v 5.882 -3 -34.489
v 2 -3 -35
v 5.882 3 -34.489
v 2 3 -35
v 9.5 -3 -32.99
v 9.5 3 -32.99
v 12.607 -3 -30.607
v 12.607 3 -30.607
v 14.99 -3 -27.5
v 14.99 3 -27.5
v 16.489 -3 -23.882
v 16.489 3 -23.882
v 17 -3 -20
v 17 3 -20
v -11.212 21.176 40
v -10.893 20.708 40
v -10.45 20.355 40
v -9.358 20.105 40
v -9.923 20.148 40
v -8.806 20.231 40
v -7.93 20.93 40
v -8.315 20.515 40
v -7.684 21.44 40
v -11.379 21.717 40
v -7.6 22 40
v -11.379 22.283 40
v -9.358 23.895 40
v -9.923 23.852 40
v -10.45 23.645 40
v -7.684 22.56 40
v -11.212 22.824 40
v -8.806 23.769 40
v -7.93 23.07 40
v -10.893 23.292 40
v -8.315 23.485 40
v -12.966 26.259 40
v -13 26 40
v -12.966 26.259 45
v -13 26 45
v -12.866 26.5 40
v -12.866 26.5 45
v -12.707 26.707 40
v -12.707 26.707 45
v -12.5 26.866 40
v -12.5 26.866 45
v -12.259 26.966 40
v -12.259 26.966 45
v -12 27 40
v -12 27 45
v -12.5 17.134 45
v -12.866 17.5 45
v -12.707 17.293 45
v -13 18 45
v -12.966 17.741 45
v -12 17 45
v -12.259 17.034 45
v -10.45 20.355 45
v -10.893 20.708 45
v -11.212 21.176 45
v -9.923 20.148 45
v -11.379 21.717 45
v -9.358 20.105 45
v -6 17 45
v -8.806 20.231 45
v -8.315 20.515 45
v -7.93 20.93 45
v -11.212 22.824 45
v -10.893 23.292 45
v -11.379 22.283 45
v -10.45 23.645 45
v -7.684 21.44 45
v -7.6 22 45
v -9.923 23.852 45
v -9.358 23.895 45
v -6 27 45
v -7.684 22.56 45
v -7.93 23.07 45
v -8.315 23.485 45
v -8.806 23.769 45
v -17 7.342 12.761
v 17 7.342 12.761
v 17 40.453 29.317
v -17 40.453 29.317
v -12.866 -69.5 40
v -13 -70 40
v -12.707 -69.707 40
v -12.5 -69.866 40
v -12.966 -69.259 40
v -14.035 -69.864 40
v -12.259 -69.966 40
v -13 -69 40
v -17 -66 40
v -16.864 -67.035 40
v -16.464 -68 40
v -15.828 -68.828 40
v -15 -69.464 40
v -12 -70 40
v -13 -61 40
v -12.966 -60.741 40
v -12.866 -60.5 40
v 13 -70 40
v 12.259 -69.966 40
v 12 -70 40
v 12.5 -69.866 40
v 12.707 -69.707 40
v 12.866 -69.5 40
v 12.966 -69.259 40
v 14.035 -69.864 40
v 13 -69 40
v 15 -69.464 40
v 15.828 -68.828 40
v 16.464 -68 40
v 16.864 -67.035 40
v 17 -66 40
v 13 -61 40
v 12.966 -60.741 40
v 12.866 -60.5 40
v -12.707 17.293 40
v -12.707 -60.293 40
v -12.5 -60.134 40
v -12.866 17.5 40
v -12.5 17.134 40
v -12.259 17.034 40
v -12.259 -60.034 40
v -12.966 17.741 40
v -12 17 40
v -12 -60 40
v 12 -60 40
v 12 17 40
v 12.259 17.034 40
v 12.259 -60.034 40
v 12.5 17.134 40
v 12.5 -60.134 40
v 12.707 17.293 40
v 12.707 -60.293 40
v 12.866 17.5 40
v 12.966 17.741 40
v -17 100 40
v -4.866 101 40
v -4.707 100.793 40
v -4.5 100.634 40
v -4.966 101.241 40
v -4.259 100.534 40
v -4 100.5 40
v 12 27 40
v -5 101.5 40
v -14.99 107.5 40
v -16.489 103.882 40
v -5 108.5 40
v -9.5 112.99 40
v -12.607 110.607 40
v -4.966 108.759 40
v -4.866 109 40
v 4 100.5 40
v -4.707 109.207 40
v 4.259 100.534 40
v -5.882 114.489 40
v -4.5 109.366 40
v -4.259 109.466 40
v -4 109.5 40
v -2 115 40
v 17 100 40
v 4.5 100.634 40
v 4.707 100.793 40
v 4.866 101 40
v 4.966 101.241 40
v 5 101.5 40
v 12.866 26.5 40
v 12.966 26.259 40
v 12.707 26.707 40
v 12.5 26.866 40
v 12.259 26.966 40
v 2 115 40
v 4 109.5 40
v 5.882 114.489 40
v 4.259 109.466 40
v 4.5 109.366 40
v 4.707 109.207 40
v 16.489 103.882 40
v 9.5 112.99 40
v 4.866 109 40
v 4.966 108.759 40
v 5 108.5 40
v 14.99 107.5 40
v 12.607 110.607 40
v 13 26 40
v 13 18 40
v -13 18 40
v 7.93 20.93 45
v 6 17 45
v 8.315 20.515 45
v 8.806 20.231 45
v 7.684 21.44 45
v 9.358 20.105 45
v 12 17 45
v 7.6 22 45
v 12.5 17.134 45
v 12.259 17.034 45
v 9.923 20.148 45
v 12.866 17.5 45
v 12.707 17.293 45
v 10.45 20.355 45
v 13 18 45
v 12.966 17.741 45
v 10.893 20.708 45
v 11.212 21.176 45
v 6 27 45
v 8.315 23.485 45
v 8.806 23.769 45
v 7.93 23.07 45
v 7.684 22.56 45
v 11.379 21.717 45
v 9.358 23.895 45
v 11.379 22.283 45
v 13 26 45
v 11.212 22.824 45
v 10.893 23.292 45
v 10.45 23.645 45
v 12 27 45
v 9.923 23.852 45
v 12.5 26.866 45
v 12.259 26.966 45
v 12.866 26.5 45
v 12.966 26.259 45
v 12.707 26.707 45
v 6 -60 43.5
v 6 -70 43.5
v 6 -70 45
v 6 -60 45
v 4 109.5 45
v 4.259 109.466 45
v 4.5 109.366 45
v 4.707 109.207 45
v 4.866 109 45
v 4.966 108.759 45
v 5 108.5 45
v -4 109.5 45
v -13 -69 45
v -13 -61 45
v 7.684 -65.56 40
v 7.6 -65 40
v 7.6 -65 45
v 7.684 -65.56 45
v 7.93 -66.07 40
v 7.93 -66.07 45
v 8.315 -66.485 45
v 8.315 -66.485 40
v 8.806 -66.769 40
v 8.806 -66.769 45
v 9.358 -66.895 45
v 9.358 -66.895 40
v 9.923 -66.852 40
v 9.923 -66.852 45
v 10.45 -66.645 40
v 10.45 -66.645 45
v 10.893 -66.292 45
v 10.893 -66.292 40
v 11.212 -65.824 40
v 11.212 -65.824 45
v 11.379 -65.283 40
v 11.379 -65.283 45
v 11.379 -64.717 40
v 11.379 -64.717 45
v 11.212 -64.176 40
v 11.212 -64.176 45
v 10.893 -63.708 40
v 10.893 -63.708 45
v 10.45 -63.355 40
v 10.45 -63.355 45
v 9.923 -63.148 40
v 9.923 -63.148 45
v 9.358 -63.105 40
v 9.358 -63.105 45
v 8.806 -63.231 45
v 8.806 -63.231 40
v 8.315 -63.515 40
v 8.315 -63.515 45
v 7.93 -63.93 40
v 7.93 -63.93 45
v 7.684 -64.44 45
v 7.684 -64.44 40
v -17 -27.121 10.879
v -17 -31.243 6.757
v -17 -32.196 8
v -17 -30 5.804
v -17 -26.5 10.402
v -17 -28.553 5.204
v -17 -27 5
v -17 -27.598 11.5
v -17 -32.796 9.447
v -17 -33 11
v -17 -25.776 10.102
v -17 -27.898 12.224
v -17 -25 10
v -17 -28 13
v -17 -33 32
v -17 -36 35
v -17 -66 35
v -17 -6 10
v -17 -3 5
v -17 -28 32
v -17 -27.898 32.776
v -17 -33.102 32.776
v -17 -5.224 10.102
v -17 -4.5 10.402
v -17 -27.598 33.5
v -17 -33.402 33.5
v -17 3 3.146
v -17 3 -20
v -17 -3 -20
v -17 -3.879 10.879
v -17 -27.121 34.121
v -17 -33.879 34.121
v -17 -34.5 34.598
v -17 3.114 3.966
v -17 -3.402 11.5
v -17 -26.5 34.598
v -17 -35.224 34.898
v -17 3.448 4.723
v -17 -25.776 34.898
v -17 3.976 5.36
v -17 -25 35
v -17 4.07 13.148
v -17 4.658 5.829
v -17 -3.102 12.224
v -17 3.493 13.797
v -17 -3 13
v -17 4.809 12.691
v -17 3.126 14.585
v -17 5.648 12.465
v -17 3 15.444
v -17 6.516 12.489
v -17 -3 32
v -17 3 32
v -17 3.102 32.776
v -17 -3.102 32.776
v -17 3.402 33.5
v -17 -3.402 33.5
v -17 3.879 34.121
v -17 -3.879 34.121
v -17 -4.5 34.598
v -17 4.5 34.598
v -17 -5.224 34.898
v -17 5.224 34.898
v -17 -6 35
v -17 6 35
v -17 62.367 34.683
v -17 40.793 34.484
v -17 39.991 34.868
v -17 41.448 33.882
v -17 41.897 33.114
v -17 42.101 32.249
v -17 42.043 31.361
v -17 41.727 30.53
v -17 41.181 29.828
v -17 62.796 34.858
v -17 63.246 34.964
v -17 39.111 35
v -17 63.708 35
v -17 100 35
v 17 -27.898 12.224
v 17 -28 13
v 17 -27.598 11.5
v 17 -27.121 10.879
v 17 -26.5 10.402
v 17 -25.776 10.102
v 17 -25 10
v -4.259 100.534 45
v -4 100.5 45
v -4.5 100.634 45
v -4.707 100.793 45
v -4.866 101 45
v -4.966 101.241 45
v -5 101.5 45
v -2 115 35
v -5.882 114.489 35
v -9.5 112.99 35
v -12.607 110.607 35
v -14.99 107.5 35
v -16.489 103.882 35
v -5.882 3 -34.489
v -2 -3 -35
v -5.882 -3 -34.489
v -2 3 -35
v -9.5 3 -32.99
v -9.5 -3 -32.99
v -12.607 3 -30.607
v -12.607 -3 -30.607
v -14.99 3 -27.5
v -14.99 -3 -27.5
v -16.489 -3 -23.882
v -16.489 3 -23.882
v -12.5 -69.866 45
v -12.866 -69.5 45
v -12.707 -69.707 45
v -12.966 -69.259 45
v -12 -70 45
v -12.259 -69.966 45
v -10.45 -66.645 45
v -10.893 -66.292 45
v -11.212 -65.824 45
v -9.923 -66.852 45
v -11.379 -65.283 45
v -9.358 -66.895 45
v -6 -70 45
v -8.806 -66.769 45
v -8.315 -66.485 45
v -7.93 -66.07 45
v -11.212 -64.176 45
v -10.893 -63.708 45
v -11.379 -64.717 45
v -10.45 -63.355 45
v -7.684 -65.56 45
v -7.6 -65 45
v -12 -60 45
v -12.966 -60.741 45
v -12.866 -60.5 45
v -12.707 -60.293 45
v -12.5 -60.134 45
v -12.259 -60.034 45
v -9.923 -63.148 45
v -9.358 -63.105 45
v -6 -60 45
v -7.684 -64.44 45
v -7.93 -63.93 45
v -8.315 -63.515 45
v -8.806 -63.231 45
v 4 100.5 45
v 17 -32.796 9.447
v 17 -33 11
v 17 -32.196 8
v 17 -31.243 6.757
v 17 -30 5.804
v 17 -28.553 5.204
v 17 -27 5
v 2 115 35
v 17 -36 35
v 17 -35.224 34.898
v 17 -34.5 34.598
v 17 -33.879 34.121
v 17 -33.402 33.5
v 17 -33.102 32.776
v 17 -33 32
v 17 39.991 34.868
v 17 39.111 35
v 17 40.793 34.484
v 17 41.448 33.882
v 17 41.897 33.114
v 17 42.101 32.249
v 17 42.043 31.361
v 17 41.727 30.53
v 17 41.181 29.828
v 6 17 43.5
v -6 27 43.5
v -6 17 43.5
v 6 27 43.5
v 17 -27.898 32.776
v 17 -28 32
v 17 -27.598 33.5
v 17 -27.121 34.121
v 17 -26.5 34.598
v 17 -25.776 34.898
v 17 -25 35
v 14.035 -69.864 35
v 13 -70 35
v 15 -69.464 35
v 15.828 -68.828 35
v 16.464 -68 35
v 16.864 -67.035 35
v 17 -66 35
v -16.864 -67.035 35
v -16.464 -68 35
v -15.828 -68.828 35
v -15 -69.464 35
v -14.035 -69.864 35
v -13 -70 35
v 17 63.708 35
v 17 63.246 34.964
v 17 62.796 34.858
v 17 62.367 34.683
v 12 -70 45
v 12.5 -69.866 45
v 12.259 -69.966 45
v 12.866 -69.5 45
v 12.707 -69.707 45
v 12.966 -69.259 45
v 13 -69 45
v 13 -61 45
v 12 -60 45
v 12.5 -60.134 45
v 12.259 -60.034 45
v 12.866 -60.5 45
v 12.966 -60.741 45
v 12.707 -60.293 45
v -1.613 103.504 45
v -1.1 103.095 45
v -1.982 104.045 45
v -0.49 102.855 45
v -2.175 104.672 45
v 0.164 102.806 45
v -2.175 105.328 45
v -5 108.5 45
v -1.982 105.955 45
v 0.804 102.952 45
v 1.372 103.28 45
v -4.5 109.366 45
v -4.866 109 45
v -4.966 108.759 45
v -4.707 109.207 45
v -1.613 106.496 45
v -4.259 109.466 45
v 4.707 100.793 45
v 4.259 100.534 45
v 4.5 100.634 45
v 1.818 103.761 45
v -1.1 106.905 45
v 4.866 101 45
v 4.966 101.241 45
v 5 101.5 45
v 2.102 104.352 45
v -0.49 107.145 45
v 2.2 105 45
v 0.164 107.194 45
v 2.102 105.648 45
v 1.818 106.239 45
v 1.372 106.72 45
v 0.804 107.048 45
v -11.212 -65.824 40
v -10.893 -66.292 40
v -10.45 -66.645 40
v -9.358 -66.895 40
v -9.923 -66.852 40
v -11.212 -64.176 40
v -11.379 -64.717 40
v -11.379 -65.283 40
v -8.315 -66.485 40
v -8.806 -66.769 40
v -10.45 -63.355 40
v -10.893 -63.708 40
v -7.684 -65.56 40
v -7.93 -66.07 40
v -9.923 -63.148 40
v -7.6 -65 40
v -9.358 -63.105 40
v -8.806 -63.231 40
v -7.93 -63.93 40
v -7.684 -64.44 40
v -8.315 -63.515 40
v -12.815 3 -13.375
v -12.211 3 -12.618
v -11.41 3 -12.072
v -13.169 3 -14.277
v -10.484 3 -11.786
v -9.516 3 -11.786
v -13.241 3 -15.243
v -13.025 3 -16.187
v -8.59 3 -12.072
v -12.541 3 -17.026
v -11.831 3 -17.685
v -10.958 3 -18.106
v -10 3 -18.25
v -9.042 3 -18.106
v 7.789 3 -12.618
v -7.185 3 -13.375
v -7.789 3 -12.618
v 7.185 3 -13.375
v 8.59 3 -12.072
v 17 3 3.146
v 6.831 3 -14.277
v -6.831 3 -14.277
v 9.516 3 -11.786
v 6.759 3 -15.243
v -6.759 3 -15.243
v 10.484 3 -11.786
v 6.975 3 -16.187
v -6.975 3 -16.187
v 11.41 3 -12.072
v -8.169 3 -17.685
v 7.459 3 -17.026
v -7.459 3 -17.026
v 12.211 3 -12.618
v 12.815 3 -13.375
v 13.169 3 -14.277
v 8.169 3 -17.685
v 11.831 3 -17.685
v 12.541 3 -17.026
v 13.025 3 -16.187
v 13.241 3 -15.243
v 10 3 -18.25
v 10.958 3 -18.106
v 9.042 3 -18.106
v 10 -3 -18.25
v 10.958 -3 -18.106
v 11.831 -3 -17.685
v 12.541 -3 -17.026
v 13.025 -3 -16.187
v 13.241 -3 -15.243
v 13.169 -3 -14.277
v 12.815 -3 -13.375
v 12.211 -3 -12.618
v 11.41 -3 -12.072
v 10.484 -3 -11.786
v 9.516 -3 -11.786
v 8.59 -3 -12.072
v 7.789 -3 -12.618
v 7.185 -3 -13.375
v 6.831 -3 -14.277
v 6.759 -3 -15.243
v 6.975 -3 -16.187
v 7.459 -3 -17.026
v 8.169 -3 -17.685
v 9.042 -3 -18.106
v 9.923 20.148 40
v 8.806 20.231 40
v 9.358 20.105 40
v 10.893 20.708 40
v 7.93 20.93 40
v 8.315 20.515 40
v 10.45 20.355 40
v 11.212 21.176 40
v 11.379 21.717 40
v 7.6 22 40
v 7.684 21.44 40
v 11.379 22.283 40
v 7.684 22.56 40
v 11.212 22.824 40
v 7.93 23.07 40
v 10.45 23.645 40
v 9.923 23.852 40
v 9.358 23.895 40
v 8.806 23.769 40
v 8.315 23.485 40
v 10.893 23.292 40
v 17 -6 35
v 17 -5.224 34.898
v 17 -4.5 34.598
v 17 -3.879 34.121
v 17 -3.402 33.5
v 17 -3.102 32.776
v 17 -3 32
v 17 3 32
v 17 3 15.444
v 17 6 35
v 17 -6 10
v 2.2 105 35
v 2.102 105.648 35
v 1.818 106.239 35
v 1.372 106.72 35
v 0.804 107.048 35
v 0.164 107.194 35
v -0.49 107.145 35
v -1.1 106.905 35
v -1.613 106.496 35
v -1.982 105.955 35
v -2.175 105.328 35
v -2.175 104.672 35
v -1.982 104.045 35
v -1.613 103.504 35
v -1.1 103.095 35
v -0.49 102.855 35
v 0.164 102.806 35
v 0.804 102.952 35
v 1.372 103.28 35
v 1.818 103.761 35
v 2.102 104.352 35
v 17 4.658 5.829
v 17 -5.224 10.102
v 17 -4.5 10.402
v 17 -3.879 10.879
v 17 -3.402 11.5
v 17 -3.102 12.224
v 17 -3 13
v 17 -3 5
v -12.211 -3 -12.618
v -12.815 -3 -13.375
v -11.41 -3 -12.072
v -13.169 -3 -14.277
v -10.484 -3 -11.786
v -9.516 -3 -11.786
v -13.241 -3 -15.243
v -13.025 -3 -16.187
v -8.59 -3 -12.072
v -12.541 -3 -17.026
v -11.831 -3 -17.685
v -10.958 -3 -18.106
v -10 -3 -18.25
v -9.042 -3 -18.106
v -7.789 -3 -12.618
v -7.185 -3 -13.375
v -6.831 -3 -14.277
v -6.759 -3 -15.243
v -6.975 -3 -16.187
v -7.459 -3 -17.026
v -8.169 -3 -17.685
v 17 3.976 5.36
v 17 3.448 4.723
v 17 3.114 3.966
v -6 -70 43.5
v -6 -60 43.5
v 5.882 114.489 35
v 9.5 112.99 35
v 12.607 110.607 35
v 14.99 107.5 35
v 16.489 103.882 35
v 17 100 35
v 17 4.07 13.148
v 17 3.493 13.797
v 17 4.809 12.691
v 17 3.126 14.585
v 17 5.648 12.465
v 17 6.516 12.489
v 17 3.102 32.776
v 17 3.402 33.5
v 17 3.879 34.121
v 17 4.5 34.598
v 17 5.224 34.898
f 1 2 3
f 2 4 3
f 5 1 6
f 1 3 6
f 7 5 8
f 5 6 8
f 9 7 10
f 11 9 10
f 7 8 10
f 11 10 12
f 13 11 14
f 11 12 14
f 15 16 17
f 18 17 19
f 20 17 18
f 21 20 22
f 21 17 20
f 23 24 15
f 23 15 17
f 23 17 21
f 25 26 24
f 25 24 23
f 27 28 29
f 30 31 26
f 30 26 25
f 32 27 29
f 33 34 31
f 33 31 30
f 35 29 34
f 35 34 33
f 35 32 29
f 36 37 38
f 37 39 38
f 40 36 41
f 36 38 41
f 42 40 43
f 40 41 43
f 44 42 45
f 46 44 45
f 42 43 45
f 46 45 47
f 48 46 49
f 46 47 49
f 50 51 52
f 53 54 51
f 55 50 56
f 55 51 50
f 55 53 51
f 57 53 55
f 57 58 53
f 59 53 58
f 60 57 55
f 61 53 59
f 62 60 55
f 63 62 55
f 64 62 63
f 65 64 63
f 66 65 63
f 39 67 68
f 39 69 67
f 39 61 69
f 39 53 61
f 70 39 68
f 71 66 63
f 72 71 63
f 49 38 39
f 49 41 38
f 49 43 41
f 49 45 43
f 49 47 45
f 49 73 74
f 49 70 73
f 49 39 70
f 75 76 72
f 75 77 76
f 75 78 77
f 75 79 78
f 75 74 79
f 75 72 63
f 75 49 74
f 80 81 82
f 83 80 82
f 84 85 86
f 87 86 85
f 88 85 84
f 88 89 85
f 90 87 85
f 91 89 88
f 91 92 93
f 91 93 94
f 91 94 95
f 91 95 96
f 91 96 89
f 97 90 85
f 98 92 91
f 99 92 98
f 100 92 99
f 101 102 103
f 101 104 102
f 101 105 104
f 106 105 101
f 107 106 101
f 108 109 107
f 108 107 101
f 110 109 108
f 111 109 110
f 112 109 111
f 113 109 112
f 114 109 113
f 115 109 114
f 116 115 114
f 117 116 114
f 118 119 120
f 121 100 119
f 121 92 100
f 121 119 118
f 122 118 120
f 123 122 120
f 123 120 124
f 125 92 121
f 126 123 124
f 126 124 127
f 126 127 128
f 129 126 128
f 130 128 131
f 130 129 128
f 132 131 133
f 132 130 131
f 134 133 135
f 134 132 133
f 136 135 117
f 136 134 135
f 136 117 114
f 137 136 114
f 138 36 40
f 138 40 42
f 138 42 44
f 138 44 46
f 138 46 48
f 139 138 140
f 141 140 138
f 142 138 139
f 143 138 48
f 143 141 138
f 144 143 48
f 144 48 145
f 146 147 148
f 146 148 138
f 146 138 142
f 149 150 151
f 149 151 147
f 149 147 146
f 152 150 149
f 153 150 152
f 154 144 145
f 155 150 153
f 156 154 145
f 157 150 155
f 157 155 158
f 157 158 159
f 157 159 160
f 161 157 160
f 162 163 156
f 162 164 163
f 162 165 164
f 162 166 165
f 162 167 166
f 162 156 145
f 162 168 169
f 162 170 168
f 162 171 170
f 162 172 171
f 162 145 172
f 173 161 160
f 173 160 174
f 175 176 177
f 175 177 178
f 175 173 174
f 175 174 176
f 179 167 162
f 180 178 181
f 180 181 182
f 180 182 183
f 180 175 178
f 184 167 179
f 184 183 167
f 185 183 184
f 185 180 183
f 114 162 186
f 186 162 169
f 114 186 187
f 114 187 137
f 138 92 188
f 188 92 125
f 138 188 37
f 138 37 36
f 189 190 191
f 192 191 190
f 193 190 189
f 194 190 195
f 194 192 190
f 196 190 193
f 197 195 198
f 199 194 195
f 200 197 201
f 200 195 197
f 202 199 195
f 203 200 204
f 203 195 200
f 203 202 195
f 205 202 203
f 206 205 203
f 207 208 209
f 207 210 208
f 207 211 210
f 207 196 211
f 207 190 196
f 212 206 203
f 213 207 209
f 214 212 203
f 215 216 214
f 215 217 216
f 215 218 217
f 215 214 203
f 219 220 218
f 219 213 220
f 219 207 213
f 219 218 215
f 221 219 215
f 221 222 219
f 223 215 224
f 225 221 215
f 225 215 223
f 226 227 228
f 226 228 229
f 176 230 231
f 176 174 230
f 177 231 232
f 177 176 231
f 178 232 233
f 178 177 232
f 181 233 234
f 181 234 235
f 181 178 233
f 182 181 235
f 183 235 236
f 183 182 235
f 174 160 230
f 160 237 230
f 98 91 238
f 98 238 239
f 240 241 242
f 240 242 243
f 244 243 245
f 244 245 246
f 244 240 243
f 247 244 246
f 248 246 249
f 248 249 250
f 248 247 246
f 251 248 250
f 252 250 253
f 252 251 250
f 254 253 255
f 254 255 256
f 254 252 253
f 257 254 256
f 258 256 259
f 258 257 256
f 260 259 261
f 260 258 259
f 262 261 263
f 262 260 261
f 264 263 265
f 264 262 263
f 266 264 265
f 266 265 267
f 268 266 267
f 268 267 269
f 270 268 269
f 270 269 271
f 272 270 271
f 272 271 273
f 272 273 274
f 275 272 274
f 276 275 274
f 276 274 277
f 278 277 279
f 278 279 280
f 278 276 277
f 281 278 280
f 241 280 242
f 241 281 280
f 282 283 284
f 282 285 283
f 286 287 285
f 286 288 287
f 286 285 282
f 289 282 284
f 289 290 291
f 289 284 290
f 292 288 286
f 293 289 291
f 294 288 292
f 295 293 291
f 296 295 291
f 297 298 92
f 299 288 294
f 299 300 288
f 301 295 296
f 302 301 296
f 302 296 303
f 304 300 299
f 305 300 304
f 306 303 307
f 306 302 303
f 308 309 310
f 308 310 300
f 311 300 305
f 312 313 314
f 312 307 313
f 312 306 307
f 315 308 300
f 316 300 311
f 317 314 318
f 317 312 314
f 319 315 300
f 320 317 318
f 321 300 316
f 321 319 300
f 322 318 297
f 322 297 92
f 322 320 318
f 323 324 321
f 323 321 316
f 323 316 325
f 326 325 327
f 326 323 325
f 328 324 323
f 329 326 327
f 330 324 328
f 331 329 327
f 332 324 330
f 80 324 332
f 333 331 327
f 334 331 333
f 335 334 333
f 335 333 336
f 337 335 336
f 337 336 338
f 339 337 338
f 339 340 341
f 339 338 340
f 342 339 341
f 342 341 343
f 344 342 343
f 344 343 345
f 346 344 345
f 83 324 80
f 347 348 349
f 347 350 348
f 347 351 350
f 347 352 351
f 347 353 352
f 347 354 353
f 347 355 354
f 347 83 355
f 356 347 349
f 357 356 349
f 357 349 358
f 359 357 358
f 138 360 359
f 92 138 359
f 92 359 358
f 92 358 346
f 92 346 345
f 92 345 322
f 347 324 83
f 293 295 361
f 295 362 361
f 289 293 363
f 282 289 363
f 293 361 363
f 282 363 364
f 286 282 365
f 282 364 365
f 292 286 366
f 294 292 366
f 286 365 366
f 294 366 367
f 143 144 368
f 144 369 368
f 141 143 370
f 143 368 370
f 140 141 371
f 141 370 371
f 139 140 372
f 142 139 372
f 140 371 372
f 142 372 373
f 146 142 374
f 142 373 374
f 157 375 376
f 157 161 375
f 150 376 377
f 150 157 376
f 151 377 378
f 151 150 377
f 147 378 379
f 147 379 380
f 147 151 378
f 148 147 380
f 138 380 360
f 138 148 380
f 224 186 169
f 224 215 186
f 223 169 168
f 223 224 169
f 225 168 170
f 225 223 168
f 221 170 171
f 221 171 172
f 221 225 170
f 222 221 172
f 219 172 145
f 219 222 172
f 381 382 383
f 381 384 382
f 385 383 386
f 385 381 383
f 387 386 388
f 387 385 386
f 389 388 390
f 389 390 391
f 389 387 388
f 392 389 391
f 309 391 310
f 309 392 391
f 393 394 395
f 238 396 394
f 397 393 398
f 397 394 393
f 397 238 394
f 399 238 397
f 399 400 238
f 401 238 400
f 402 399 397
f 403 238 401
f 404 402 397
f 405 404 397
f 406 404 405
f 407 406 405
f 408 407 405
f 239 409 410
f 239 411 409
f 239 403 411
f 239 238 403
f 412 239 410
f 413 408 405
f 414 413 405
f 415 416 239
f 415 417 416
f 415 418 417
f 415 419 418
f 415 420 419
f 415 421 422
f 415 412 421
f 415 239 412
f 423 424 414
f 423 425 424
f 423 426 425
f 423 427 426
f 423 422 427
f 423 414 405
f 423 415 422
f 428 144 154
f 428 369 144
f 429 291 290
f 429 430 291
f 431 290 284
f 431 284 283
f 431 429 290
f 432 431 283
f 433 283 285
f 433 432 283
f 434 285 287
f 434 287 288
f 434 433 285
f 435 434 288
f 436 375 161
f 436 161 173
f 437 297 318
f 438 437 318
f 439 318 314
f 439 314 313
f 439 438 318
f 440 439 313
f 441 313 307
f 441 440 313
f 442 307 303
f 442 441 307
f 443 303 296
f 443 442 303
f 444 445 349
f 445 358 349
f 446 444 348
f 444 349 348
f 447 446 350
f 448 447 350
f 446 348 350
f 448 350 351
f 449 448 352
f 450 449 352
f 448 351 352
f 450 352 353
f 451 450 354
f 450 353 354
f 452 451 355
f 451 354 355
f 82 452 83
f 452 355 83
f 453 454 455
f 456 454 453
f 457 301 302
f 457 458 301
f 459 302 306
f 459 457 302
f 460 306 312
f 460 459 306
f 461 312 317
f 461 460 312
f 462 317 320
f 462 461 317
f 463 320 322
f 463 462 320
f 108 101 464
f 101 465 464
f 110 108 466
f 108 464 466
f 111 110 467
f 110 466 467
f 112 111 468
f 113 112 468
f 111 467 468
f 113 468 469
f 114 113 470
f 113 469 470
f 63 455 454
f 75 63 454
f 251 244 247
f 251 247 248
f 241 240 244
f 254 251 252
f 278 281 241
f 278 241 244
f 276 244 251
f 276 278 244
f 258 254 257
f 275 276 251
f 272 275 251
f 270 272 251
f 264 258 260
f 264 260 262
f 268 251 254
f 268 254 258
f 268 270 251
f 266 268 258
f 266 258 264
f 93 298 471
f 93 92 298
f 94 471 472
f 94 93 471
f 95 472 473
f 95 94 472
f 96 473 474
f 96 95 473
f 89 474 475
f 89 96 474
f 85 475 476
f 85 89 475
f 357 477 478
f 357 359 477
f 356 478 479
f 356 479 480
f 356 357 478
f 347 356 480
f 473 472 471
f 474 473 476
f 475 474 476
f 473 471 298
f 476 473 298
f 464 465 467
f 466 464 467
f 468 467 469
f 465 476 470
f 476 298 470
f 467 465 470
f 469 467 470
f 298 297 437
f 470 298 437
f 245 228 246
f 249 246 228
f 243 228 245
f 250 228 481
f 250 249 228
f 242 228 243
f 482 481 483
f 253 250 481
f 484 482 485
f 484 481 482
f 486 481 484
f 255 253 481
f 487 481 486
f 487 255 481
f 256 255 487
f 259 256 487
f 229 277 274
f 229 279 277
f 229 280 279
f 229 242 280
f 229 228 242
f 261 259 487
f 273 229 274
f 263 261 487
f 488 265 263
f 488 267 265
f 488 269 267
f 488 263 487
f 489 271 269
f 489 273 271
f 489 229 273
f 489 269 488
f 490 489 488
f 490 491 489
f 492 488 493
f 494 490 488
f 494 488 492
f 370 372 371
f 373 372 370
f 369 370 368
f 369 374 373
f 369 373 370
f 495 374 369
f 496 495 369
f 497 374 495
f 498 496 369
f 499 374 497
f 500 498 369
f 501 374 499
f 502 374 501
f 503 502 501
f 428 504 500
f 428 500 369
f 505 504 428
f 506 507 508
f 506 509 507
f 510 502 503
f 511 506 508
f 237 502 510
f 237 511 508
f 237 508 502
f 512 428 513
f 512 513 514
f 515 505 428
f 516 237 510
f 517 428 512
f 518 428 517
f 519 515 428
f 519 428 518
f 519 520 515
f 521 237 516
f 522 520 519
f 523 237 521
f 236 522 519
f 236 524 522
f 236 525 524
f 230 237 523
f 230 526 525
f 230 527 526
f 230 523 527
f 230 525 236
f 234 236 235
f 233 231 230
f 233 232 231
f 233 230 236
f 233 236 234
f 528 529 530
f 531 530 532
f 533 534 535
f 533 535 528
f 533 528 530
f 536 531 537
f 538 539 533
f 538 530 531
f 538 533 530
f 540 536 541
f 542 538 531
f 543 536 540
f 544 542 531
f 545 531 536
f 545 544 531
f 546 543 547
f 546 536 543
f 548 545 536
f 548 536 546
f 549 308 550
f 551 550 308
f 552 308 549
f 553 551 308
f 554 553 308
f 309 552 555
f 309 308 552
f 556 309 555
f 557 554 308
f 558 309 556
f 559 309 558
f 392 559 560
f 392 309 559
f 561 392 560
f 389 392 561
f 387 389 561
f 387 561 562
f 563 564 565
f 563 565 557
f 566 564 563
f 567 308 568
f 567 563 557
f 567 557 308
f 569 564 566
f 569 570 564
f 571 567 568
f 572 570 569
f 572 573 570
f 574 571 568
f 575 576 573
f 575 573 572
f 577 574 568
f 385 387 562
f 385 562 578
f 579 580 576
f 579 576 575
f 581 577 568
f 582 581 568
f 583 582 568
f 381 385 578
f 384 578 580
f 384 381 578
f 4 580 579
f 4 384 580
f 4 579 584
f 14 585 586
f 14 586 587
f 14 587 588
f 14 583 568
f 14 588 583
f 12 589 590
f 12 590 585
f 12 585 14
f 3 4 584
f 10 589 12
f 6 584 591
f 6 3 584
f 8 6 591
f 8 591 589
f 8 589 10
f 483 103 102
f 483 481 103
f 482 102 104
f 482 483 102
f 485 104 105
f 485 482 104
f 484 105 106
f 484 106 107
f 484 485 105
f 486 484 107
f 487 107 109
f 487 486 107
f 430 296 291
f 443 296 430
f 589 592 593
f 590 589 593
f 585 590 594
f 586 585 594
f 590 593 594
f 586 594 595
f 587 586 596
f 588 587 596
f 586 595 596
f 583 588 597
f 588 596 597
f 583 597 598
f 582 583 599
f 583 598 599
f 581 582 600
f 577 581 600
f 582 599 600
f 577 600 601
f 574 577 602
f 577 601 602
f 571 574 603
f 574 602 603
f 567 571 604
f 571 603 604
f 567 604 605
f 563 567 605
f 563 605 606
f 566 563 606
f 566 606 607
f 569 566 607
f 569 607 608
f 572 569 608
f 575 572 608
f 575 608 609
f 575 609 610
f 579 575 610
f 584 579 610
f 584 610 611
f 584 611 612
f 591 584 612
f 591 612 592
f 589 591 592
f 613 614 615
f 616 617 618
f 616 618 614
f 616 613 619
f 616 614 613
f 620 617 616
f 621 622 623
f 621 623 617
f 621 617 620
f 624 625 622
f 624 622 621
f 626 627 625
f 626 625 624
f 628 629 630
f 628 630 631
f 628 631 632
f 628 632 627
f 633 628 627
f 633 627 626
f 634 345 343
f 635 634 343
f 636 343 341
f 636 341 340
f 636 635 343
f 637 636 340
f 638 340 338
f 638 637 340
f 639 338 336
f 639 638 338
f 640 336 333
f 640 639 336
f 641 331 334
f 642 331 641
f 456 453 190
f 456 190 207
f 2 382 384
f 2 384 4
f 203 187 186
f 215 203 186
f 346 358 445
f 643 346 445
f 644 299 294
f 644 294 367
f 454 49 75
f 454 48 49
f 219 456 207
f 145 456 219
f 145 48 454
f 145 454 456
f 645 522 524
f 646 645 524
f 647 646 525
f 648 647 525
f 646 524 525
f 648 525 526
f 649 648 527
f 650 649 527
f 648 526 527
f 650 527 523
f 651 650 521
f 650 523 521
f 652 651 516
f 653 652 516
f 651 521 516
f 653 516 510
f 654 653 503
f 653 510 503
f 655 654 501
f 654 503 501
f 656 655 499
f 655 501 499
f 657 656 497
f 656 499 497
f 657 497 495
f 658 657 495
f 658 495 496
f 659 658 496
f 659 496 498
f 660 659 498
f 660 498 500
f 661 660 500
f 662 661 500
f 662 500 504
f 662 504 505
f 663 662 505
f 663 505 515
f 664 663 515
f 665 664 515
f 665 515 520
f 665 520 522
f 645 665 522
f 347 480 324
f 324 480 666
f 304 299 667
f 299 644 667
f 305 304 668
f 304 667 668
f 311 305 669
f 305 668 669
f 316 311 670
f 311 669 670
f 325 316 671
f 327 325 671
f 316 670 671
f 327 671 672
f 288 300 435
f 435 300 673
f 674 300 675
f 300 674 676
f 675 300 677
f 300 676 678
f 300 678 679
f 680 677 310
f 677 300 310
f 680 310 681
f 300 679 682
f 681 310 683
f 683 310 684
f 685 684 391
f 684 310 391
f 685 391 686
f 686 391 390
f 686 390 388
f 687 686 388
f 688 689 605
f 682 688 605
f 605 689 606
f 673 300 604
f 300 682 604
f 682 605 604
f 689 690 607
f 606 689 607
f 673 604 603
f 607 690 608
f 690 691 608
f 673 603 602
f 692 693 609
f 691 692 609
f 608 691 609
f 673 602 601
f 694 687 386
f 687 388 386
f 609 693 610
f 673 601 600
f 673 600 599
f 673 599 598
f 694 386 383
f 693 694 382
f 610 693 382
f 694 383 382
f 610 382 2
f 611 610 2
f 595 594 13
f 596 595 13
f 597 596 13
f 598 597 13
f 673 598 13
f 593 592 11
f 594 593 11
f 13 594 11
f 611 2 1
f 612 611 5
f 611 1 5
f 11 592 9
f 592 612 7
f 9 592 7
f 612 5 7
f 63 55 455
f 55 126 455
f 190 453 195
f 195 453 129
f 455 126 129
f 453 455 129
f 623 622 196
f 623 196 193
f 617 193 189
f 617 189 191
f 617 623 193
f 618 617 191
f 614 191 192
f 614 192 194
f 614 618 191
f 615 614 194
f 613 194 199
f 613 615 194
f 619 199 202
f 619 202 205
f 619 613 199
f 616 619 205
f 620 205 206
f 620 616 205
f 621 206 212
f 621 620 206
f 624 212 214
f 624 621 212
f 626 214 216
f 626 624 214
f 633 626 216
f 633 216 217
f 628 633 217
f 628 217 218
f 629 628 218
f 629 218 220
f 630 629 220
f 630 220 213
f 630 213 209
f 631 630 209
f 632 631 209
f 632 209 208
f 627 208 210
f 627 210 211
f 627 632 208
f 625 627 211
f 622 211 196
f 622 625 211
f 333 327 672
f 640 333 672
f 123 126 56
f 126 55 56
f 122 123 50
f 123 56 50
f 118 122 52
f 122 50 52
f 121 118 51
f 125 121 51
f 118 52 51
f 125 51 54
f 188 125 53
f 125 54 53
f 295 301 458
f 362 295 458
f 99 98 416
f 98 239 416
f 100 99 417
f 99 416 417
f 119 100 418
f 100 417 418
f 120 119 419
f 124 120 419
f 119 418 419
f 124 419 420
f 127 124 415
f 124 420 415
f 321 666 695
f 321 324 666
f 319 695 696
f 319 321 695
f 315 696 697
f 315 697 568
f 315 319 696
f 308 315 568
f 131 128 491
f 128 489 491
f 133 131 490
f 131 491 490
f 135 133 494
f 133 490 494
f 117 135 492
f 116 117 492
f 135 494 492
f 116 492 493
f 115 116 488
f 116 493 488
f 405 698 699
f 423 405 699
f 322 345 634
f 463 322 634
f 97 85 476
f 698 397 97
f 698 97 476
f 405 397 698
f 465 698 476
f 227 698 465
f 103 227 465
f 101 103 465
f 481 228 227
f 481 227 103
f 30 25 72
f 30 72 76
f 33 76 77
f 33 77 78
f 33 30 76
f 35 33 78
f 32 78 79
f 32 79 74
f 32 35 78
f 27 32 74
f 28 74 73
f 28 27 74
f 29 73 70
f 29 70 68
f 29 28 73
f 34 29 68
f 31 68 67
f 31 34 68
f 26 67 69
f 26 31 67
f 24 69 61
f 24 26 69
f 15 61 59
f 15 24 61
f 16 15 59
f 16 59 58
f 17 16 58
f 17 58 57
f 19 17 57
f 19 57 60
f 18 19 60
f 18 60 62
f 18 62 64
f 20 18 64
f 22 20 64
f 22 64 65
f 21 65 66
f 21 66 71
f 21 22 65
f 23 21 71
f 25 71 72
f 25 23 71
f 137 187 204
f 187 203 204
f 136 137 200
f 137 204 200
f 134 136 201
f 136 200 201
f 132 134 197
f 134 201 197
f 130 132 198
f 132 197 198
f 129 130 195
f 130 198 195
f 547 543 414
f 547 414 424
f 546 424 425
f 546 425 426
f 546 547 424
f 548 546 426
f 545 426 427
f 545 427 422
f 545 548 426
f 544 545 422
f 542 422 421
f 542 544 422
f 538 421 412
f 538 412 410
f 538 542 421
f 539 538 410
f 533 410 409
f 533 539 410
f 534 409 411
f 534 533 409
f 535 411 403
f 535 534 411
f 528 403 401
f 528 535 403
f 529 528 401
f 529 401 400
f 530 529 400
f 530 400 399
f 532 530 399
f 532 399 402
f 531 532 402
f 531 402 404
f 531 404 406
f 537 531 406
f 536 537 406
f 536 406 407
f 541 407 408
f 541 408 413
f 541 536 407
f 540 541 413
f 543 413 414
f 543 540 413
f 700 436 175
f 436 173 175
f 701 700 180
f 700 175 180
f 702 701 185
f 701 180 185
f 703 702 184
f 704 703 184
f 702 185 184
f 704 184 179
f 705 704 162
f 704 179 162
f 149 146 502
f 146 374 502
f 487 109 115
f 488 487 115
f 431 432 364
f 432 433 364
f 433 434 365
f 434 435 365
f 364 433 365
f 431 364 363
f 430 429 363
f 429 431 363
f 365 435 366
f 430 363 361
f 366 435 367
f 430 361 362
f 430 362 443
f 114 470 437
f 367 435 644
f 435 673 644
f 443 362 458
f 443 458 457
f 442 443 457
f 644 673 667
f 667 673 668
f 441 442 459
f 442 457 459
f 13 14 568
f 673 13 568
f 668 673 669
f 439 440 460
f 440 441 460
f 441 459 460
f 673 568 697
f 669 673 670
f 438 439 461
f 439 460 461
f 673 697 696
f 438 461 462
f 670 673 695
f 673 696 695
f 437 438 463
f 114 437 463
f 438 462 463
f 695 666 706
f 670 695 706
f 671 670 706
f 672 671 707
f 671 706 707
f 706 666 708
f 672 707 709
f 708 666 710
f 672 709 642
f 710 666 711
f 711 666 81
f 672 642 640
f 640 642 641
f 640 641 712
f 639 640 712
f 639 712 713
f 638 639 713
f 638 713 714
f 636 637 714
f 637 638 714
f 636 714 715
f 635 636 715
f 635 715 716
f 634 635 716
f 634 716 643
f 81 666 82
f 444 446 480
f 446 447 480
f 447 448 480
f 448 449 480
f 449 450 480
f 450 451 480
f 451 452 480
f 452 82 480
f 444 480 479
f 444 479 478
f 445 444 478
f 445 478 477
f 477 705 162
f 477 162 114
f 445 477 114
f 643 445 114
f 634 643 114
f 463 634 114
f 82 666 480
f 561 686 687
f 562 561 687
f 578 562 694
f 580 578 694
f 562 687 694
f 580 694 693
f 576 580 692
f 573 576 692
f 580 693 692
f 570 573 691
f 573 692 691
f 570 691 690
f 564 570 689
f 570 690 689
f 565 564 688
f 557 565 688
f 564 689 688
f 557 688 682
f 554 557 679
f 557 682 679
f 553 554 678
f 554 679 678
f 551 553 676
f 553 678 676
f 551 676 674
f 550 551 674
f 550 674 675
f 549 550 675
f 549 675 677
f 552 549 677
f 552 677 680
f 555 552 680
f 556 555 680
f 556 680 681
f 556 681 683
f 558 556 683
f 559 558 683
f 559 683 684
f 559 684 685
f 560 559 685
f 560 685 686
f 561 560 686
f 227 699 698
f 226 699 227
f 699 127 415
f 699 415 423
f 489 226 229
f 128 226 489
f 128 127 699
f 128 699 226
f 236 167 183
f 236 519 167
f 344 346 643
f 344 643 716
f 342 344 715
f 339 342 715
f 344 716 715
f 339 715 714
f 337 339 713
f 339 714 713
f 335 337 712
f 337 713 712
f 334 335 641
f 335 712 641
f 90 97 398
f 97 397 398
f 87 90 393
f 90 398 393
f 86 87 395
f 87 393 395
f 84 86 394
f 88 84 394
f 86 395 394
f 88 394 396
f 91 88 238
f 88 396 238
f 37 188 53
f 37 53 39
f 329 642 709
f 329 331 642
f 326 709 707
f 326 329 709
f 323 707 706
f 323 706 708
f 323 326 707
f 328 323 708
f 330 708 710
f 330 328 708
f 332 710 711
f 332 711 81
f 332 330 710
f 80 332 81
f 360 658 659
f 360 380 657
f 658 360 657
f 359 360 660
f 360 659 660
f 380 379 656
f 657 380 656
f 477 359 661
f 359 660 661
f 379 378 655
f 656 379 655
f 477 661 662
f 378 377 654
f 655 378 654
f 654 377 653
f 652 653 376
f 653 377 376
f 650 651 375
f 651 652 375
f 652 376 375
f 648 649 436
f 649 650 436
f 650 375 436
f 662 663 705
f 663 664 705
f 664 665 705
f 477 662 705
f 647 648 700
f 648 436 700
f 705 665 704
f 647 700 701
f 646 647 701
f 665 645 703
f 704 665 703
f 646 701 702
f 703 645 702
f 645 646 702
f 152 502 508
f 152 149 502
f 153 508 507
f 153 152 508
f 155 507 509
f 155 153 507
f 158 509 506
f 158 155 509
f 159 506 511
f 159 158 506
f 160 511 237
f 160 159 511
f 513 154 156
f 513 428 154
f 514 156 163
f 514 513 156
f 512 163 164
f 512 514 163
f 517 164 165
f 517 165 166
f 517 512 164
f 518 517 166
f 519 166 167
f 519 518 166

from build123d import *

# Parameters (mm, degrees)
EXTRUDE_1_DEPTH      = 3
EXTRUDE_1_DEPTH_BACK = 3
SKETCH_1_W           = 34
SKETCH_1_H           = 70
SKETCH_3_W           = 34
SKETCH_3_H           = 230
EXTRUDE_2_DEPTH      = 5
SKETCH_4_W           = 34
SKETCH_4_H           = 5
EXTRUDE_3_DEPTH      = 30
EXTRUDE_START        = -5
EXTRUDE_4_OUTLINE_W  = 34
EXTRUDE_4_OUTLINE_H  = 25
EXTRUDE_4_DEPTH      = 5
SKETCH_7_R           = 2.2
CUT_EXTRUDE_1_DEPTH  = 139.343774706
SKETCH_9_R           = 3.25
CUT_EXTRUDE_3_DEPTH  = 126.749751491
EXTRUDE_5_DEPTH      = 34
SKETCH_12_W          = 37
SKETCH_12_H          = 52.36766615
CUT_EXTRUDE_5_DEPTH  = 139.343774706
EXTRUDE_START_2      = 3.5
SKETCH_13_W          = 12
SKETCH_13_H          = 10
SKETCH_13_W_2        = 10
SKETCH_13_H_2        = 9
SKETCH_13_R          = 2.2
EXTRUDE_6_DEPTH      = 3.5
EXTRUDE_START_3      = 1.5
SKETCH_14_W          = 10
SKETCH_14_H          = 9
SKETCH_14_R          = 2.2
EXTRUDE_7_DEPTH      = 1.5
SKETCH_15_W          = 7
SKETCH_15_H          = 10
SKETCH_15_R          = 1.9
EXTRUDE_8_DEPTH      = 5
FILLET_2_R           = 15
FILLET_3_R           = 4
FILLET_4_R           = 3
FILLET_5_R           = 6
FILLET_6_R           = 1


# Read off the part's stored shape, not the designer's step: 凸台-拉伸4
with BuildPart() as part:
    # 草图1 → 凸台-拉伸1 (new, two sides: drawn at the far end of the back side and taken through both)
    with BuildSketch(Plane(origin=(0, 0, 0), x_dir=(1, 0, 0), z_dir=(0, 1, 0)).offset(-EXTRUDE_1_DEPTH_BACK)):
        Rectangle(SKETCH_1_W, SKETCH_1_H)
    extrude(amount=EXTRUDE_1_DEPTH + EXTRUDE_1_DEPTH_BACK)

    # 草图3 → 凸台-拉伸2 (add)
    with BuildSketch(Plane.XY.offset(35)):
        Rectangle(SKETCH_3_W, SKETCH_3_H)
    extrude(amount=EXTRUDE_2_DEPTH)

    # 草图4 → 凸台-拉伸3 (add)
    with BuildSketch(Plane.XZ.offset(3)):
        with Locations((0, 7.5)):
            Rectangle(SKETCH_4_W, SKETCH_4_H)
    extrude(amount=EXTRUDE_3_DEPTH)

    # 凸台-拉伸4 outline → 凸台-拉伸4 (add)
    with BuildSketch(Plane.XZ.offset(33).offset(EXTRUDE_START)):
        with Locations((0, 22.5)):
            Rectangle(EXTRUDE_4_OUTLINE_W, EXTRUDE_4_OUTLINE_H)
    extrude(amount=EXTRUDE_4_DEPTH)

    # 草图7 → 切除-拉伸1 (cut, through all)
    with BuildSketch(Plane.XY.offset(40)):
        with Locations((0, -105)):
            Circle(SKETCH_7_R)
        with Locations((0, 105)):
            Circle(SKETCH_7_R)
    extrude(amount=-CUT_EXTRUDE_1_DEPTH, mode=Mode.SUBTRACT)

    # 草图9 → 切除-拉伸3 (cut, through all)
    with BuildSketch(Plane.XZ.offset(3)):
        with Locations(Location((10, -15, 0), (0, 0, 270))):
            Circle(SKETCH_9_R)
        with Locations(Location((-10, -15, 0), (0, 0, 270))):
            Circle(SKETCH_9_R)
    extrude(amount=-CUT_EXTRUDE_3_DEPTH, mode=Mode.SUBTRACT)

    # 草图10 → 凸台-拉伸5 (add)
    with BuildSketch(Plane(origin=(17, 0, 0), x_dir=(0, 0, -1), z_dir=(1, 0, 0))):
        Polygon((-35, 51.819660113), (-35, 63), (-5, 3), (-10.590169944, 3), align=None)
    extrude(amount=-EXTRUDE_5_DEPTH)

    # 草图12 → 切除-拉伸5 (cut, through all)
    with BuildSketch(Plane.XY.offset(40)):
        with Locations((-1.5, -96.183833075)):
            Rectangle(SKETCH_12_W, SKETCH_12_H)
    extrude(amount=-CUT_EXTRUDE_5_DEPTH, mode=Mode.SUBTRACT)

    # 草图13 → 凸台-拉伸6 (add)
    # profile 1 of 3: a face of its own
    with BuildSketch(Plane.XY.offset(40).offset(EXTRUDE_START_2)):
        with Locations((0, -65)):
            Rectangle(SKETCH_13_W, SKETCH_13_H)
    # profile 2 of 3: a face of its own
    with BuildSketch(Plane.XY.offset(40).offset(EXTRUDE_START_2)):
        with Locations((0, 22)):
            Rectangle(SKETCH_13_W, SKETCH_13_H)
    # profile 3 of 3: a face of its own
    with BuildSketch(Plane.XY.offset(40).offset(EXTRUDE_START_2)):
        with Locations((0, 105)):
            Rectangle(SKETCH_13_W_2, SKETCH_13_H_2)
        with Locations((0, 105)):
            Circle(SKETCH_13_R, mode=Mode.SUBTRACT)
    extrude(amount=-EXTRUDE_6_DEPTH)

    # 草图14 → 凸台-拉伸7 (add)
    with BuildSketch(Plane.XY.offset(43.5).offset(EXTRUDE_START_3)):
        with Locations((0, 105)):
            Rectangle(SKETCH_14_W, SKETCH_14_H)
        with Locations((0, 105)):
            Circle(SKETCH_14_R, mode=Mode.SUBTRACT)
    extrude(amount=-EXTRUDE_7_DEPTH)

    # 草图15 → 凸台-拉伸8 (add)
    # profile 1 of 4: a face of its own
    with BuildSketch(Plane.XY.offset(40)):
        with Locations((-9.5, 22)):
            Rectangle(SKETCH_15_W, SKETCH_15_H)
        with Locations((-9.5, 22)):
            Circle(SKETCH_15_R, mode=Mode.SUBTRACT)
    # profile 2 of 4: a face of its own
    with BuildSketch(Plane.XY.offset(40)):
        with Locations((-9.5, -65)):
            Rectangle(SKETCH_15_W, SKETCH_15_H)
        with Locations((-9.5, -65)):
            Circle(SKETCH_15_R, mode=Mode.SUBTRACT)
    # profile 3 of 4: a face of its own
    with BuildSketch(Plane.XY.offset(40)):
        with Locations((9.5, 22)):
            Rectangle(SKETCH_15_W, SKETCH_15_H)
        with Locations(Location((9.5, 22, 0), (0, 0, 180))):
            Circle(SKETCH_15_R, mode=Mode.SUBTRACT)
    # profile 4 of 4: a face of its own
    with BuildSketch(Plane.XY.offset(40)):
        with Locations((9.5, -65)):
            Rectangle(SKETCH_15_W, SKETCH_15_H)
        with Locations(Location((9.5, -65, 0), (0, 0, 180))):
            Circle(SKETCH_15_R, mode=Mode.SUBTRACT)
    extrude(amount=EXTRUDE_8_DEPTH)

    # 圆角2
    fillet_2_edges = [part.edges().sort_by_distance(p)[0] for p in [
        (17, 115, 37.5),
        (-17, 115, 37.5),
        (-17, 0, -35),
        (17, 0, -35),
    ]]
    fillet(fillet_2_edges, radius=FILLET_2_R)

    # 圆角3
    fillet_3_edges = [part.edges().sort_by_distance(p)[0] for p in [
        (-17, -70, 37.5),
        (17, -70, 37.5),
    ]]
    fillet(fillet_3_edges, radius=FILLET_3_R)

    # 圆角4
    fillet_4_edges = [part.edges().sort_by_distance(p)[0] for p in [
        (0, 3, 5),
        (0, 3, 10.590169944),
        (0, 51.819660113, 35),
        (0, 63, 35),
        (0, -3, 35),
        (0, 3, 35),
        (0, -3, 10),
        (0, -28, 10),
        (0, -33, 35),
        (0, -28, 35),
    ]]
    fillet(fillet_4_edges, radius=FILLET_4_R)

    # 圆角5
    fillet_5_edges = [part.edges().sort_by_distance(p)[0] for p in [
        (0, -33, 5),
    ]]
    fillet(fillet_5_edges, radius=FILLET_5_R)

    # 圆角6
    fillet_6_edges = [part.edges().sort_by_distance(p)[0] for p in [
        (5, 100.5, 42.5),
        (5, 109.5, 42.5),
        (-5, 109.5, 42.5),
        (-5, 100.5, 42.5),
        (-13, 27, 42.5),
        (-13, 17, 42.5),
        (-13, -60, 42.5),
        (-13, -70, 42.5),
        (13, 27, 42.5),
        (13, 17, 42.5),
        (13, -70, 42.5),
        (13, -60, 42.5),
    ]]
    fillet(fillet_6_edges, radius=FILLET_6_R)


solid = part.part
